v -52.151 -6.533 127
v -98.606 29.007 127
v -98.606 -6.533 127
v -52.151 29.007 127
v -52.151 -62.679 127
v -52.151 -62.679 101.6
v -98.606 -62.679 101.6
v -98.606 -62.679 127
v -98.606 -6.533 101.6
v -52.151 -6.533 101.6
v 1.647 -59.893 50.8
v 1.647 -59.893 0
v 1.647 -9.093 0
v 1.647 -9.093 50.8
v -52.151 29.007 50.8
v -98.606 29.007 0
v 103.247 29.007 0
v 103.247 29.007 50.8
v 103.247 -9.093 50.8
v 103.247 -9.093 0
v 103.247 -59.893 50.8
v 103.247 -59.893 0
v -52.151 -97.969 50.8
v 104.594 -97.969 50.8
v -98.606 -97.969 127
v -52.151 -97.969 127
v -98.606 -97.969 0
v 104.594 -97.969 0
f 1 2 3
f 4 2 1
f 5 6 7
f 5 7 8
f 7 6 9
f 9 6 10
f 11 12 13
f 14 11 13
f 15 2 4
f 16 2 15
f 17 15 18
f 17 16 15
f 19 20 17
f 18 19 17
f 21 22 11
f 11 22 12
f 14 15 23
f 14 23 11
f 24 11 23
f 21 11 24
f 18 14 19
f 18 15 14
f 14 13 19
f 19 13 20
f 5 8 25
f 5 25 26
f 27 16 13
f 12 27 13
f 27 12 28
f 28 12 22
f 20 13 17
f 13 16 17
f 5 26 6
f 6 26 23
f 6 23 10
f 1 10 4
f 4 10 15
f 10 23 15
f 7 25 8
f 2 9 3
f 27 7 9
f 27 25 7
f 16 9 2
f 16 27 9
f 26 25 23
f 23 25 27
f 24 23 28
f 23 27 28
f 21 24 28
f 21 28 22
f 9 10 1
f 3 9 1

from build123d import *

# Parameters (mm, degrees)
F1_DEPTH = 50.8
F2_W     = 46.454286
F2_H     = 126.976152
F3_DEPTH = 76.2
F4_W     = 56.145773
F4_H     = 25.4
F5_DEPTH = 50.8


with BuildPart() as f1:
    # F0 (on Top) → F1 (new body)
    with BuildSketch(Plane.XY):
        Polygon((103.246617, 29.007021), (-98.60556, 29.007021), (-98.60556, -97.969131), (104.59444, -97.969131), (103.246617, -59.892979), (1.646617, -59.892979), (1.646617, -9.092979), (103.246617, -9.092979), align=None)
    extrude(amount=F1_DEPTH)

    # F2 (on face) → F3 (join)
    with BuildSketch(Plane.XY.offset(50.8)):
        with Locations((-75.378417, -34.481055)):
            Rectangle(F2_W, F2_H)
    extrude(amount=F3_DEPTH)

    # F4 (on face) → F5 (cut)
    with BuildSketch(Plane.YZ.offset(-52.151274)):
        with Locations((-34.605823, 114.3)):
            Rectangle(F4_W, F4_H)
    extrude(amount=-F5_DEPTH, mode=Mode.SUBTRACT)


solid = f1.part
